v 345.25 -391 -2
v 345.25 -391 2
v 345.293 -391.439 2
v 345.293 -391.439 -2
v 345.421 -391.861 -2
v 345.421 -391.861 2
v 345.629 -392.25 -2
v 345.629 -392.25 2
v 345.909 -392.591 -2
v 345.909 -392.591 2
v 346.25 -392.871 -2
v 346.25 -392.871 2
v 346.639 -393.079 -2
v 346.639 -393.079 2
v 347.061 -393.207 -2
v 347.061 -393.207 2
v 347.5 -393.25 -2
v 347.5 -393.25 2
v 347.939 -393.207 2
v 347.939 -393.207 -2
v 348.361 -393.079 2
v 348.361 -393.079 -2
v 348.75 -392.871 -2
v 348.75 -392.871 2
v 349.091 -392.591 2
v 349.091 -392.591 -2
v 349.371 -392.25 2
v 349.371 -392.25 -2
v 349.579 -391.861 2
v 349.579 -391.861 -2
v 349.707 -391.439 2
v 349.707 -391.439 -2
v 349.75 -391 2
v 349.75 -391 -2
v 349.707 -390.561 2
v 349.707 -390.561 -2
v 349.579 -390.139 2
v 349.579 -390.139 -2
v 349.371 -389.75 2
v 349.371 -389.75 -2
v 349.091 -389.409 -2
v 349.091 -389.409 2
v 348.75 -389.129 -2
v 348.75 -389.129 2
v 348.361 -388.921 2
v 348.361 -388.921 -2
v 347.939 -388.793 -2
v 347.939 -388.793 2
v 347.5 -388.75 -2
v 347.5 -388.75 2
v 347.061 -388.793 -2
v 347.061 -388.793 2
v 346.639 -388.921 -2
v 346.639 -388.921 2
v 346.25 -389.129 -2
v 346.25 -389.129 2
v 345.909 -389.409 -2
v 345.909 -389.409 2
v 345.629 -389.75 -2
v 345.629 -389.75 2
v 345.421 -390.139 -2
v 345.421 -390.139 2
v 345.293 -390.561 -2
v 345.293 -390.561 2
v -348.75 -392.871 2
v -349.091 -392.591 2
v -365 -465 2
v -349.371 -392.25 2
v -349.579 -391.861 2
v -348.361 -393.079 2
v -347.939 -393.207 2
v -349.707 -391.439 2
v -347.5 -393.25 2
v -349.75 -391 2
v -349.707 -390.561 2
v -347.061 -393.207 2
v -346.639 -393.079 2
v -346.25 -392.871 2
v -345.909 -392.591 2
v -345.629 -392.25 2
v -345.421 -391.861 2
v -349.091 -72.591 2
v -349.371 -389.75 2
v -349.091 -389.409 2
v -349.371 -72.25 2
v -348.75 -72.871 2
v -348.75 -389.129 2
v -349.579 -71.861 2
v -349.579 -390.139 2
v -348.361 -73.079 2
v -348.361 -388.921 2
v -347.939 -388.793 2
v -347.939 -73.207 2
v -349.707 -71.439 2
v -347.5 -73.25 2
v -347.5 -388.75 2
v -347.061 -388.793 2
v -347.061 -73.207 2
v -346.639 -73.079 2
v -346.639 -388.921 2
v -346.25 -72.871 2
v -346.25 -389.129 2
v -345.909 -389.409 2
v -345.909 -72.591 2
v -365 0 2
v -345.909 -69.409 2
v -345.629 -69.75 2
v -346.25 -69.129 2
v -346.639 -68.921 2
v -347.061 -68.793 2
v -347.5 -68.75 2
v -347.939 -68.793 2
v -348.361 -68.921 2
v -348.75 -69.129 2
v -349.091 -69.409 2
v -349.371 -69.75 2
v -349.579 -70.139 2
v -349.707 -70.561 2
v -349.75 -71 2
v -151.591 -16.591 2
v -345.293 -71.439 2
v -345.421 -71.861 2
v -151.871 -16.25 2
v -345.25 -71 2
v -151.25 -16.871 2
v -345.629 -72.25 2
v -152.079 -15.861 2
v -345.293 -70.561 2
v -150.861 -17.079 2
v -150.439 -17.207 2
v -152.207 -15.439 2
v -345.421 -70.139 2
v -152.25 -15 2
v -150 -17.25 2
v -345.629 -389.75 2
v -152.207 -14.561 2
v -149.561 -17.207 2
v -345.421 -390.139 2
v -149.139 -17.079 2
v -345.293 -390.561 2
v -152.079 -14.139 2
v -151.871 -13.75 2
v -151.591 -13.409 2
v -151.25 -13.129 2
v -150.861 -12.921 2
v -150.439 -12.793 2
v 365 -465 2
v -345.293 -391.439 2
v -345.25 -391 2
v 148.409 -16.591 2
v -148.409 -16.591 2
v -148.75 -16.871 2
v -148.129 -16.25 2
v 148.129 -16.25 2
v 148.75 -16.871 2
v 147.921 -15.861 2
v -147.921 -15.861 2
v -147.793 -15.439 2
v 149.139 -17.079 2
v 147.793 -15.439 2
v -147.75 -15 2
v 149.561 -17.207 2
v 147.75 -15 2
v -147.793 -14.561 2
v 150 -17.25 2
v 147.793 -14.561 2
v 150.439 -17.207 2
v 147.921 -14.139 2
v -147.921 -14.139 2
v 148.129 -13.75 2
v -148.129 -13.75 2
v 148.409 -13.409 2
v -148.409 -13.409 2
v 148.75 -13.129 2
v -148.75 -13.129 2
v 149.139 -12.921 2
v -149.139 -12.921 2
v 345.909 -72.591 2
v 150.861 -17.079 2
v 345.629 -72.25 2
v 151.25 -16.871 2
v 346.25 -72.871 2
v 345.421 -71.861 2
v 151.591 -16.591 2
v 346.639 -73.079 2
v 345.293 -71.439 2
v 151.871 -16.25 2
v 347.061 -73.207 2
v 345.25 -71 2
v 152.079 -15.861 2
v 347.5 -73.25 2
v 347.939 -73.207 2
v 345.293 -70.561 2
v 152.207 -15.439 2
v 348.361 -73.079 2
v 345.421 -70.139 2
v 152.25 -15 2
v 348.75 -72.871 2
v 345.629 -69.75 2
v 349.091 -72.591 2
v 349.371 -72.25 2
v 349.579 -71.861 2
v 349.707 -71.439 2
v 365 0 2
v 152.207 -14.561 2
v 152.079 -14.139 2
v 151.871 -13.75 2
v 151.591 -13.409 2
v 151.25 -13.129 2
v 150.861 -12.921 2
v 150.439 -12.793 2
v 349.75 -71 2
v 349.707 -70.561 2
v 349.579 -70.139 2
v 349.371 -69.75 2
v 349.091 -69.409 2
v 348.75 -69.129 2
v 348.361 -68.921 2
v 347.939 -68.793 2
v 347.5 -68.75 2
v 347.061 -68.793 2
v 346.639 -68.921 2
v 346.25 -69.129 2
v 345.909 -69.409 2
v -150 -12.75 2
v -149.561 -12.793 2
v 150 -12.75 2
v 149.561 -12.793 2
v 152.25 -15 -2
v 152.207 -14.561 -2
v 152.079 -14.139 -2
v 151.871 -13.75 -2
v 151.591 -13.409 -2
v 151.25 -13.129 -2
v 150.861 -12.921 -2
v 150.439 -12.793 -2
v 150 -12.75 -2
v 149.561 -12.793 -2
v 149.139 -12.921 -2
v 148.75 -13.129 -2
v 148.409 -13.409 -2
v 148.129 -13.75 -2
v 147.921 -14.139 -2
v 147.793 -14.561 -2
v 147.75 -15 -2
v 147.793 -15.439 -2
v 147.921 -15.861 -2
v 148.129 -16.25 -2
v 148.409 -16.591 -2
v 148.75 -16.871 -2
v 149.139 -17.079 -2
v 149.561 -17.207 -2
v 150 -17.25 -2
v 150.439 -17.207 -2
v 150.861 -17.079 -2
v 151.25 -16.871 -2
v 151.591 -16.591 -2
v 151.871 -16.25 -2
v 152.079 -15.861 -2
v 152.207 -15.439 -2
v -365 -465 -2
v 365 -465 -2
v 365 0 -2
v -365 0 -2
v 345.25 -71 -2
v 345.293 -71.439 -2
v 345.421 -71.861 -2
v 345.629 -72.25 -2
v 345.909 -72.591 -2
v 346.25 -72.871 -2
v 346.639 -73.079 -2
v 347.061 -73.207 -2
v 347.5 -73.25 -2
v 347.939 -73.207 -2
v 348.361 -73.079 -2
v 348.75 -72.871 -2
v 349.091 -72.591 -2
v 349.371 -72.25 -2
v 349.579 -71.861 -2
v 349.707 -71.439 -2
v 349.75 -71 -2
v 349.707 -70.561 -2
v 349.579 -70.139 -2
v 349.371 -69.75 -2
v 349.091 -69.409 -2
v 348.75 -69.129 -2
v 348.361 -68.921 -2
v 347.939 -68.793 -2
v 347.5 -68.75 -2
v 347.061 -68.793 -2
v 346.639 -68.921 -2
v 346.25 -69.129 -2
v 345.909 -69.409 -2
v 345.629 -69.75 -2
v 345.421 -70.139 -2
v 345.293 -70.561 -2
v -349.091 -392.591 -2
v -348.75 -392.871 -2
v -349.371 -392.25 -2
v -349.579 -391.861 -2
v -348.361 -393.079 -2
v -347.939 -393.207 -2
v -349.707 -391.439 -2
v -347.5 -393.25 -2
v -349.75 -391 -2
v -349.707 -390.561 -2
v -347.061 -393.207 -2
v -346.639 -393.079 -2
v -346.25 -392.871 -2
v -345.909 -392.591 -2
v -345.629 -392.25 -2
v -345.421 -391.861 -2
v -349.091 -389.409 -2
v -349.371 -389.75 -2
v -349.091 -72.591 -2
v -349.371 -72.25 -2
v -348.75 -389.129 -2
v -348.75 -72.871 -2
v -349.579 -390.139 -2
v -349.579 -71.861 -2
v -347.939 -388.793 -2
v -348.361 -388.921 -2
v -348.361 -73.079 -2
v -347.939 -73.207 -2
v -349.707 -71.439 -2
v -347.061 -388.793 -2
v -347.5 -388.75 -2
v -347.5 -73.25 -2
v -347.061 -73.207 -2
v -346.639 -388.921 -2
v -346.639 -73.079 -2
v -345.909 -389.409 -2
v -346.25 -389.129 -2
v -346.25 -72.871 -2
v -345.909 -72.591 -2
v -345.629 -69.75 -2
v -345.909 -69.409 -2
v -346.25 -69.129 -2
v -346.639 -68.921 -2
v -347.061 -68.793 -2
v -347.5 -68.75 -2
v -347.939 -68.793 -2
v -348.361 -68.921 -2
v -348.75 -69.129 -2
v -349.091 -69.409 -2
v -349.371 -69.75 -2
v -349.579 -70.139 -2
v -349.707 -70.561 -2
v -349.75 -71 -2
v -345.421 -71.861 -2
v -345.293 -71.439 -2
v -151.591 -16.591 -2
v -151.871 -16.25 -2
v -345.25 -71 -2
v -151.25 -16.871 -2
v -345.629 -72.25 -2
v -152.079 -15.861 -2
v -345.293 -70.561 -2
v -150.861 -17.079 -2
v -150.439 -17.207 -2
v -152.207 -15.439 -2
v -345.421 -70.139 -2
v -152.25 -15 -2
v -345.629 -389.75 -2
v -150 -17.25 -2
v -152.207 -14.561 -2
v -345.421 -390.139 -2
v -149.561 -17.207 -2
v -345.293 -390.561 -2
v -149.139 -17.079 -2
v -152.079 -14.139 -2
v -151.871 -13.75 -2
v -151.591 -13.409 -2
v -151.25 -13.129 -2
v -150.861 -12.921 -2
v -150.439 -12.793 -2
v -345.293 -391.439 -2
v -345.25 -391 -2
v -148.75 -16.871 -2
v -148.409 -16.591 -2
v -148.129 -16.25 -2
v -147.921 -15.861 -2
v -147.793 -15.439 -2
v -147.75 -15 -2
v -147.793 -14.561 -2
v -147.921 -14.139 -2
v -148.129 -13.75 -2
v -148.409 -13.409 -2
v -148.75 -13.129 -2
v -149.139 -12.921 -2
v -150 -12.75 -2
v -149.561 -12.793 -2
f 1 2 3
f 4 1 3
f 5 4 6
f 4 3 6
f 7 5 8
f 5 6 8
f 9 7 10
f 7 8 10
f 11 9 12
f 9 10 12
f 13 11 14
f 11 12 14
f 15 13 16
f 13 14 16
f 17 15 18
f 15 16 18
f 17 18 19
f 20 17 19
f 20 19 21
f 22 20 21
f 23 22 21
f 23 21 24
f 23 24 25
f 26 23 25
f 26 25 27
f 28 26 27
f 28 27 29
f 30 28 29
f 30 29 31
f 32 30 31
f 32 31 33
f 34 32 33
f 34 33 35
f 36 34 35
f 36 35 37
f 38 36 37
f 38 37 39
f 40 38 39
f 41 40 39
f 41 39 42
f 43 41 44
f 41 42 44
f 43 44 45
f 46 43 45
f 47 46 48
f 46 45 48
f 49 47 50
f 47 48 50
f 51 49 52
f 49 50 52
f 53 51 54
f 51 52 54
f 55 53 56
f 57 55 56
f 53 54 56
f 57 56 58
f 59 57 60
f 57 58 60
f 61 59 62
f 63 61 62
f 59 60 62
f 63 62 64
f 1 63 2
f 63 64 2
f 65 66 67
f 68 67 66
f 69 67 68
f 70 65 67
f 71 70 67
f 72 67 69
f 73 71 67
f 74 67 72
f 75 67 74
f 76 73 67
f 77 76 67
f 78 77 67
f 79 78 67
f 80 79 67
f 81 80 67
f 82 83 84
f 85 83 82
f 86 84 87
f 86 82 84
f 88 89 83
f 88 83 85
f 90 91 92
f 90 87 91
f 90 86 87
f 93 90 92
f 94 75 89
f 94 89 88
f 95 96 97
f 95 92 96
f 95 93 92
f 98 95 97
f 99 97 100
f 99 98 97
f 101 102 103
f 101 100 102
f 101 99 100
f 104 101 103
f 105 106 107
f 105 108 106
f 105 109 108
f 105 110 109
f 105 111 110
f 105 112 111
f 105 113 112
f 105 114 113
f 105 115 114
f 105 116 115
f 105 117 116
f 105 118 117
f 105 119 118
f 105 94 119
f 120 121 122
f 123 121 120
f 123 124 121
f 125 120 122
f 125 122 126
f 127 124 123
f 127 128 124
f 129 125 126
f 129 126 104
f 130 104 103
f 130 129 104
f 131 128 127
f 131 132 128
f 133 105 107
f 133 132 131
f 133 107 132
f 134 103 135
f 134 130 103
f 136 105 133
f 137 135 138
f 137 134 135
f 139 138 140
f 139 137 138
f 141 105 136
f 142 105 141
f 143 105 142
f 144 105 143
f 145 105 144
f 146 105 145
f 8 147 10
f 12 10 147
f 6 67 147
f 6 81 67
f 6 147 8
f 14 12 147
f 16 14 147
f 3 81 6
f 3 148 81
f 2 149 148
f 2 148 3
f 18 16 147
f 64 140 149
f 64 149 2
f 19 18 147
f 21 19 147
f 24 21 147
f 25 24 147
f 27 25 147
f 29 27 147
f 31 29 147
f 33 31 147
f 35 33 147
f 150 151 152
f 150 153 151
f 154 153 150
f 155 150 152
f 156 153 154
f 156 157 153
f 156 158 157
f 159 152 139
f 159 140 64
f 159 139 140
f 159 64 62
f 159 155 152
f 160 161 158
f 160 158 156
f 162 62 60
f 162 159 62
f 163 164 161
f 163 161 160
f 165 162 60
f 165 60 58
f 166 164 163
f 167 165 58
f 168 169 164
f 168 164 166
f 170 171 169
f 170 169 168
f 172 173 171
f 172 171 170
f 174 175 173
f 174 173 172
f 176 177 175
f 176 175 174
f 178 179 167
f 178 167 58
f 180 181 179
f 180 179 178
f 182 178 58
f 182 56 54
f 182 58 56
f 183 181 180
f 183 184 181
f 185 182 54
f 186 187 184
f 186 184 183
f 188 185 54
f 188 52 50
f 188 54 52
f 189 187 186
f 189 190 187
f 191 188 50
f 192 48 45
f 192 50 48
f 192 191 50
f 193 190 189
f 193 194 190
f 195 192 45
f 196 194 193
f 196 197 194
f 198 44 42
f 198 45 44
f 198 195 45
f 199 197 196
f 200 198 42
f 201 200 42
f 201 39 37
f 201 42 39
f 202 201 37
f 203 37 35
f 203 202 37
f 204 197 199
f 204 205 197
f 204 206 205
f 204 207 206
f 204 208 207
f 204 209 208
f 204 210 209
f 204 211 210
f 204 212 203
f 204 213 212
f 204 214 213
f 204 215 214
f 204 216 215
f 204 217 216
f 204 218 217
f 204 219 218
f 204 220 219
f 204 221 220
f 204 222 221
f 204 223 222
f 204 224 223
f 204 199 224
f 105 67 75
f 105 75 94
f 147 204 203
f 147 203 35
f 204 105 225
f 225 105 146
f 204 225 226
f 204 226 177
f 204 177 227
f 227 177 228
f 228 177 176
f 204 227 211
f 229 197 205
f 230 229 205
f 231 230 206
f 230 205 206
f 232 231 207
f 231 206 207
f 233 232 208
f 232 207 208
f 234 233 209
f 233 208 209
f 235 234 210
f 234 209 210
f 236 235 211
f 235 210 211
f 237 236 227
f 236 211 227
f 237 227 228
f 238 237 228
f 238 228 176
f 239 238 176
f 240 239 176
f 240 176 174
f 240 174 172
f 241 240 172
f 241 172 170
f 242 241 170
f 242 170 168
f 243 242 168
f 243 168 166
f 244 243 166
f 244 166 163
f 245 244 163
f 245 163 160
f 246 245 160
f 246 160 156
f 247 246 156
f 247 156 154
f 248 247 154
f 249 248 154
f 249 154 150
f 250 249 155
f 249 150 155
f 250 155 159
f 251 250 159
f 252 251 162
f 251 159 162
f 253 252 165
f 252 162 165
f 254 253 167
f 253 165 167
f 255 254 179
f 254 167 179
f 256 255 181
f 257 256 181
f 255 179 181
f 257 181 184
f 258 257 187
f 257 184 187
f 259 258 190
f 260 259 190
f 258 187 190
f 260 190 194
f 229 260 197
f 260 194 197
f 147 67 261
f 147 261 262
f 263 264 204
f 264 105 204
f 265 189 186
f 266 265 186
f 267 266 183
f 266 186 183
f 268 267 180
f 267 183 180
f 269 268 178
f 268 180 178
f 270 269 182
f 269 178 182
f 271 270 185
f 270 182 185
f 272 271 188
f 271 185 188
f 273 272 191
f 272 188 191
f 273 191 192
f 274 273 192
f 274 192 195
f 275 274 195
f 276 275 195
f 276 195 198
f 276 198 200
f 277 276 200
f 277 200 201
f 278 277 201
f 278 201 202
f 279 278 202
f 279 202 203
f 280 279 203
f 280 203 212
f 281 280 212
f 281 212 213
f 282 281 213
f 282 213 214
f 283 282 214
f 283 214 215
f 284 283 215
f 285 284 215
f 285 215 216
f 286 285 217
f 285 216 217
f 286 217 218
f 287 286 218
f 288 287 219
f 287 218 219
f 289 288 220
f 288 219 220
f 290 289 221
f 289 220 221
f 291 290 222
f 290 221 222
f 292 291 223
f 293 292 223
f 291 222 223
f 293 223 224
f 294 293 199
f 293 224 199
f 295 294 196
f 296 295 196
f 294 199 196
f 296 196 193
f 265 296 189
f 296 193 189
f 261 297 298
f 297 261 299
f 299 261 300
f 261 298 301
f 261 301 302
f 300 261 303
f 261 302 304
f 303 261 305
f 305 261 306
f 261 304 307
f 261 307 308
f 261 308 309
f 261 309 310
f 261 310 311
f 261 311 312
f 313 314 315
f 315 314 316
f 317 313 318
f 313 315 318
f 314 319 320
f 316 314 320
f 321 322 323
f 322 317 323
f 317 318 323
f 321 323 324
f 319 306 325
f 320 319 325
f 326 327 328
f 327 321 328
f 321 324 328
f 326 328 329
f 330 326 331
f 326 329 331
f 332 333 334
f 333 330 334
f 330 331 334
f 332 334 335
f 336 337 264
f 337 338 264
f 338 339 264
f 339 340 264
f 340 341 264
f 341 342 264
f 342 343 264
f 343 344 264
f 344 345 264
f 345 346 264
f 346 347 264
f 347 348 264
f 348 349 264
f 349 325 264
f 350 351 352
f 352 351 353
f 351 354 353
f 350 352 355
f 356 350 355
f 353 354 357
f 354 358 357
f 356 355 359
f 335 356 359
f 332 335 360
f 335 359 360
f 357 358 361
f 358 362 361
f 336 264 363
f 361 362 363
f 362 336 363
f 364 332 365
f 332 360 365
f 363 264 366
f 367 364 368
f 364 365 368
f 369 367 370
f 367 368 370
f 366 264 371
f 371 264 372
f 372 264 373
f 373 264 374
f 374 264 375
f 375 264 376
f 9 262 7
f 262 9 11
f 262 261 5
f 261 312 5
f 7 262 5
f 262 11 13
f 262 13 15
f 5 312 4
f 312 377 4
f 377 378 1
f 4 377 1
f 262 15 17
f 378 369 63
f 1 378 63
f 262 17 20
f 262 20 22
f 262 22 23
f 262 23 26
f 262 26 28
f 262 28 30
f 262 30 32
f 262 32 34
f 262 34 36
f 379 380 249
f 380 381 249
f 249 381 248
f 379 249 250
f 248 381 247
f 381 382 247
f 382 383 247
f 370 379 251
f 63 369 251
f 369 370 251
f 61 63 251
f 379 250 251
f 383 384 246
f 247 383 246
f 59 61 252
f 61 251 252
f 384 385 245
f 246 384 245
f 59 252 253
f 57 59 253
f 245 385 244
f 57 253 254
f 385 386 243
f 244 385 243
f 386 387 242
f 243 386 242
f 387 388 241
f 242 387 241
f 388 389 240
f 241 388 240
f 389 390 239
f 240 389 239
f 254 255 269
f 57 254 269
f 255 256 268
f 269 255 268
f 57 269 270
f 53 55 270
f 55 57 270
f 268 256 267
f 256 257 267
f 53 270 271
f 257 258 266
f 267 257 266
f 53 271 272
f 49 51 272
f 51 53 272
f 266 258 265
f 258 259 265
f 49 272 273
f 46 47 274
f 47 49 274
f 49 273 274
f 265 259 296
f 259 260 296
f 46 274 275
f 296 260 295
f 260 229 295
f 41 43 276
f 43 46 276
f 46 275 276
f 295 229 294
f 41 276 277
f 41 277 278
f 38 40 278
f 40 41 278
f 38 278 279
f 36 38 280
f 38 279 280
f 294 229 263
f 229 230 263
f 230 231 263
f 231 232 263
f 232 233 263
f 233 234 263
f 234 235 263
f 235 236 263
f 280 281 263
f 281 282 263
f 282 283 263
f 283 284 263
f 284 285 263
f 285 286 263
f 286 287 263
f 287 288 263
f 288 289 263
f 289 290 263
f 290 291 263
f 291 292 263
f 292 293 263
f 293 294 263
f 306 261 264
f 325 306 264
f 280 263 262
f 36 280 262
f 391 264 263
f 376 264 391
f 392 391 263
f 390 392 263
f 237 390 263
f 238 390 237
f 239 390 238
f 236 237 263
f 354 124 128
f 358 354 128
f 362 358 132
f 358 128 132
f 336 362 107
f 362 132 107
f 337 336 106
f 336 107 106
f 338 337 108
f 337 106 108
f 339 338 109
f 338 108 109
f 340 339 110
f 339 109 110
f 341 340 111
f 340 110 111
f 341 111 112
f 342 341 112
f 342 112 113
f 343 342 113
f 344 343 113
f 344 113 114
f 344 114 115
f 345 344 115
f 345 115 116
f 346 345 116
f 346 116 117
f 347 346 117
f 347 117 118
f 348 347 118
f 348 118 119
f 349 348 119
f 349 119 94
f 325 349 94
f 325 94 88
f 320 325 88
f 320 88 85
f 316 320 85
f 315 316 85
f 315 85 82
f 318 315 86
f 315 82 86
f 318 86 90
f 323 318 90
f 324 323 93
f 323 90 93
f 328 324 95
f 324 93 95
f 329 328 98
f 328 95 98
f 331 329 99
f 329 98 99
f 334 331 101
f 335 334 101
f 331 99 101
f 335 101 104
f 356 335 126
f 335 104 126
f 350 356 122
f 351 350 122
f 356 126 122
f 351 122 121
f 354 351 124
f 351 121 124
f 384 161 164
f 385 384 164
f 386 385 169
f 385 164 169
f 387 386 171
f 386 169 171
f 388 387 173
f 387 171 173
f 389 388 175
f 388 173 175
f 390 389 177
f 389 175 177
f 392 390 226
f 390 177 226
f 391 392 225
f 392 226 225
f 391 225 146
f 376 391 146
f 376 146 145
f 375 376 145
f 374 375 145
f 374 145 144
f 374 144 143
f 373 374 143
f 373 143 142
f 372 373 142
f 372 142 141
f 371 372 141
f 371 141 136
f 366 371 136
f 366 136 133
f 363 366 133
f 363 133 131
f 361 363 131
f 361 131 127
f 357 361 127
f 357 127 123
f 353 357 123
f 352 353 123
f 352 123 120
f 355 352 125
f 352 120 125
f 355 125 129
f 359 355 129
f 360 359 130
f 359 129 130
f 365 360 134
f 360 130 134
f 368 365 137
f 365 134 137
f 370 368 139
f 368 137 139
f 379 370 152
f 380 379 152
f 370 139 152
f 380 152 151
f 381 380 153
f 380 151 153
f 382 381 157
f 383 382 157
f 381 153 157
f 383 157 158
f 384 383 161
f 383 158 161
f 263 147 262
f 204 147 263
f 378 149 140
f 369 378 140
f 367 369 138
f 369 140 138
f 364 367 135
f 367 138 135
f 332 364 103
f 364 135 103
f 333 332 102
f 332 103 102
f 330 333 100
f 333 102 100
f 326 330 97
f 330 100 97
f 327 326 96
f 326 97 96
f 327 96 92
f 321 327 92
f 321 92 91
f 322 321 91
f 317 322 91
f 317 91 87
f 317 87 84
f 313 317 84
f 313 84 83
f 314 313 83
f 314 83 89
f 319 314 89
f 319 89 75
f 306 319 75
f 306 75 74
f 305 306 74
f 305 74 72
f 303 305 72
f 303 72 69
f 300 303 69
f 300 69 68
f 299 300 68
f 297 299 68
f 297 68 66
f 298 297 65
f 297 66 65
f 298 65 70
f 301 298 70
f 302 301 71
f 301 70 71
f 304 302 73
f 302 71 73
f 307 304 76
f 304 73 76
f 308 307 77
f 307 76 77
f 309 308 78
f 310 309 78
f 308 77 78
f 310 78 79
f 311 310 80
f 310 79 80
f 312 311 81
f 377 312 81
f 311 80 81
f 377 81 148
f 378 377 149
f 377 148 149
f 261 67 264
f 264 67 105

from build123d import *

# Parameters (mm, degrees)
SKETCH1_W           = 730
SKETCH1_H           = 465
BOSS_EXTRUDE1_DEPTH = 2
SKETCH2_R           = 2.25
CUT_EXTRUDE1_DEPTH  = 592.156493663


with BuildPart() as part:
    # Sketch1 → Boss-Extrude1 (new, symmetric)
    with BuildSketch(Plane.XY):
        with Locations((0, -232.5)):
            Rectangle(SKETCH1_W, SKETCH1_H)
    extrude(amount=BOSS_EXTRUDE1_DEPTH, both=True)

    # Sketch2 → Cut-Extrude1 (cut, through all)
    with BuildSketch(Plane.XY.offset(2)):
        with Locations((-150, -15)):
            Circle(SKETCH2_R)
        with Locations((150, -15)):
            Circle(SKETCH2_R)
        with Locations((-347.5, -71)):
            Circle(SKETCH2_R)
        with Locations((-347.5, -391)):
            Circle(SKETCH2_R)
        with Locations(Location((347.5, -391, 0), (0, 0, 180))):
            Circle(SKETCH2_R)
        with Locations(Location((347.5, -71, 0), (0, 0, 180))):
            Circle(SKETCH2_R)
    extrude(amount=-CUT_EXTRUDE1_DEPTH, mode=Mode.SUBTRACT)


solid = part.part
